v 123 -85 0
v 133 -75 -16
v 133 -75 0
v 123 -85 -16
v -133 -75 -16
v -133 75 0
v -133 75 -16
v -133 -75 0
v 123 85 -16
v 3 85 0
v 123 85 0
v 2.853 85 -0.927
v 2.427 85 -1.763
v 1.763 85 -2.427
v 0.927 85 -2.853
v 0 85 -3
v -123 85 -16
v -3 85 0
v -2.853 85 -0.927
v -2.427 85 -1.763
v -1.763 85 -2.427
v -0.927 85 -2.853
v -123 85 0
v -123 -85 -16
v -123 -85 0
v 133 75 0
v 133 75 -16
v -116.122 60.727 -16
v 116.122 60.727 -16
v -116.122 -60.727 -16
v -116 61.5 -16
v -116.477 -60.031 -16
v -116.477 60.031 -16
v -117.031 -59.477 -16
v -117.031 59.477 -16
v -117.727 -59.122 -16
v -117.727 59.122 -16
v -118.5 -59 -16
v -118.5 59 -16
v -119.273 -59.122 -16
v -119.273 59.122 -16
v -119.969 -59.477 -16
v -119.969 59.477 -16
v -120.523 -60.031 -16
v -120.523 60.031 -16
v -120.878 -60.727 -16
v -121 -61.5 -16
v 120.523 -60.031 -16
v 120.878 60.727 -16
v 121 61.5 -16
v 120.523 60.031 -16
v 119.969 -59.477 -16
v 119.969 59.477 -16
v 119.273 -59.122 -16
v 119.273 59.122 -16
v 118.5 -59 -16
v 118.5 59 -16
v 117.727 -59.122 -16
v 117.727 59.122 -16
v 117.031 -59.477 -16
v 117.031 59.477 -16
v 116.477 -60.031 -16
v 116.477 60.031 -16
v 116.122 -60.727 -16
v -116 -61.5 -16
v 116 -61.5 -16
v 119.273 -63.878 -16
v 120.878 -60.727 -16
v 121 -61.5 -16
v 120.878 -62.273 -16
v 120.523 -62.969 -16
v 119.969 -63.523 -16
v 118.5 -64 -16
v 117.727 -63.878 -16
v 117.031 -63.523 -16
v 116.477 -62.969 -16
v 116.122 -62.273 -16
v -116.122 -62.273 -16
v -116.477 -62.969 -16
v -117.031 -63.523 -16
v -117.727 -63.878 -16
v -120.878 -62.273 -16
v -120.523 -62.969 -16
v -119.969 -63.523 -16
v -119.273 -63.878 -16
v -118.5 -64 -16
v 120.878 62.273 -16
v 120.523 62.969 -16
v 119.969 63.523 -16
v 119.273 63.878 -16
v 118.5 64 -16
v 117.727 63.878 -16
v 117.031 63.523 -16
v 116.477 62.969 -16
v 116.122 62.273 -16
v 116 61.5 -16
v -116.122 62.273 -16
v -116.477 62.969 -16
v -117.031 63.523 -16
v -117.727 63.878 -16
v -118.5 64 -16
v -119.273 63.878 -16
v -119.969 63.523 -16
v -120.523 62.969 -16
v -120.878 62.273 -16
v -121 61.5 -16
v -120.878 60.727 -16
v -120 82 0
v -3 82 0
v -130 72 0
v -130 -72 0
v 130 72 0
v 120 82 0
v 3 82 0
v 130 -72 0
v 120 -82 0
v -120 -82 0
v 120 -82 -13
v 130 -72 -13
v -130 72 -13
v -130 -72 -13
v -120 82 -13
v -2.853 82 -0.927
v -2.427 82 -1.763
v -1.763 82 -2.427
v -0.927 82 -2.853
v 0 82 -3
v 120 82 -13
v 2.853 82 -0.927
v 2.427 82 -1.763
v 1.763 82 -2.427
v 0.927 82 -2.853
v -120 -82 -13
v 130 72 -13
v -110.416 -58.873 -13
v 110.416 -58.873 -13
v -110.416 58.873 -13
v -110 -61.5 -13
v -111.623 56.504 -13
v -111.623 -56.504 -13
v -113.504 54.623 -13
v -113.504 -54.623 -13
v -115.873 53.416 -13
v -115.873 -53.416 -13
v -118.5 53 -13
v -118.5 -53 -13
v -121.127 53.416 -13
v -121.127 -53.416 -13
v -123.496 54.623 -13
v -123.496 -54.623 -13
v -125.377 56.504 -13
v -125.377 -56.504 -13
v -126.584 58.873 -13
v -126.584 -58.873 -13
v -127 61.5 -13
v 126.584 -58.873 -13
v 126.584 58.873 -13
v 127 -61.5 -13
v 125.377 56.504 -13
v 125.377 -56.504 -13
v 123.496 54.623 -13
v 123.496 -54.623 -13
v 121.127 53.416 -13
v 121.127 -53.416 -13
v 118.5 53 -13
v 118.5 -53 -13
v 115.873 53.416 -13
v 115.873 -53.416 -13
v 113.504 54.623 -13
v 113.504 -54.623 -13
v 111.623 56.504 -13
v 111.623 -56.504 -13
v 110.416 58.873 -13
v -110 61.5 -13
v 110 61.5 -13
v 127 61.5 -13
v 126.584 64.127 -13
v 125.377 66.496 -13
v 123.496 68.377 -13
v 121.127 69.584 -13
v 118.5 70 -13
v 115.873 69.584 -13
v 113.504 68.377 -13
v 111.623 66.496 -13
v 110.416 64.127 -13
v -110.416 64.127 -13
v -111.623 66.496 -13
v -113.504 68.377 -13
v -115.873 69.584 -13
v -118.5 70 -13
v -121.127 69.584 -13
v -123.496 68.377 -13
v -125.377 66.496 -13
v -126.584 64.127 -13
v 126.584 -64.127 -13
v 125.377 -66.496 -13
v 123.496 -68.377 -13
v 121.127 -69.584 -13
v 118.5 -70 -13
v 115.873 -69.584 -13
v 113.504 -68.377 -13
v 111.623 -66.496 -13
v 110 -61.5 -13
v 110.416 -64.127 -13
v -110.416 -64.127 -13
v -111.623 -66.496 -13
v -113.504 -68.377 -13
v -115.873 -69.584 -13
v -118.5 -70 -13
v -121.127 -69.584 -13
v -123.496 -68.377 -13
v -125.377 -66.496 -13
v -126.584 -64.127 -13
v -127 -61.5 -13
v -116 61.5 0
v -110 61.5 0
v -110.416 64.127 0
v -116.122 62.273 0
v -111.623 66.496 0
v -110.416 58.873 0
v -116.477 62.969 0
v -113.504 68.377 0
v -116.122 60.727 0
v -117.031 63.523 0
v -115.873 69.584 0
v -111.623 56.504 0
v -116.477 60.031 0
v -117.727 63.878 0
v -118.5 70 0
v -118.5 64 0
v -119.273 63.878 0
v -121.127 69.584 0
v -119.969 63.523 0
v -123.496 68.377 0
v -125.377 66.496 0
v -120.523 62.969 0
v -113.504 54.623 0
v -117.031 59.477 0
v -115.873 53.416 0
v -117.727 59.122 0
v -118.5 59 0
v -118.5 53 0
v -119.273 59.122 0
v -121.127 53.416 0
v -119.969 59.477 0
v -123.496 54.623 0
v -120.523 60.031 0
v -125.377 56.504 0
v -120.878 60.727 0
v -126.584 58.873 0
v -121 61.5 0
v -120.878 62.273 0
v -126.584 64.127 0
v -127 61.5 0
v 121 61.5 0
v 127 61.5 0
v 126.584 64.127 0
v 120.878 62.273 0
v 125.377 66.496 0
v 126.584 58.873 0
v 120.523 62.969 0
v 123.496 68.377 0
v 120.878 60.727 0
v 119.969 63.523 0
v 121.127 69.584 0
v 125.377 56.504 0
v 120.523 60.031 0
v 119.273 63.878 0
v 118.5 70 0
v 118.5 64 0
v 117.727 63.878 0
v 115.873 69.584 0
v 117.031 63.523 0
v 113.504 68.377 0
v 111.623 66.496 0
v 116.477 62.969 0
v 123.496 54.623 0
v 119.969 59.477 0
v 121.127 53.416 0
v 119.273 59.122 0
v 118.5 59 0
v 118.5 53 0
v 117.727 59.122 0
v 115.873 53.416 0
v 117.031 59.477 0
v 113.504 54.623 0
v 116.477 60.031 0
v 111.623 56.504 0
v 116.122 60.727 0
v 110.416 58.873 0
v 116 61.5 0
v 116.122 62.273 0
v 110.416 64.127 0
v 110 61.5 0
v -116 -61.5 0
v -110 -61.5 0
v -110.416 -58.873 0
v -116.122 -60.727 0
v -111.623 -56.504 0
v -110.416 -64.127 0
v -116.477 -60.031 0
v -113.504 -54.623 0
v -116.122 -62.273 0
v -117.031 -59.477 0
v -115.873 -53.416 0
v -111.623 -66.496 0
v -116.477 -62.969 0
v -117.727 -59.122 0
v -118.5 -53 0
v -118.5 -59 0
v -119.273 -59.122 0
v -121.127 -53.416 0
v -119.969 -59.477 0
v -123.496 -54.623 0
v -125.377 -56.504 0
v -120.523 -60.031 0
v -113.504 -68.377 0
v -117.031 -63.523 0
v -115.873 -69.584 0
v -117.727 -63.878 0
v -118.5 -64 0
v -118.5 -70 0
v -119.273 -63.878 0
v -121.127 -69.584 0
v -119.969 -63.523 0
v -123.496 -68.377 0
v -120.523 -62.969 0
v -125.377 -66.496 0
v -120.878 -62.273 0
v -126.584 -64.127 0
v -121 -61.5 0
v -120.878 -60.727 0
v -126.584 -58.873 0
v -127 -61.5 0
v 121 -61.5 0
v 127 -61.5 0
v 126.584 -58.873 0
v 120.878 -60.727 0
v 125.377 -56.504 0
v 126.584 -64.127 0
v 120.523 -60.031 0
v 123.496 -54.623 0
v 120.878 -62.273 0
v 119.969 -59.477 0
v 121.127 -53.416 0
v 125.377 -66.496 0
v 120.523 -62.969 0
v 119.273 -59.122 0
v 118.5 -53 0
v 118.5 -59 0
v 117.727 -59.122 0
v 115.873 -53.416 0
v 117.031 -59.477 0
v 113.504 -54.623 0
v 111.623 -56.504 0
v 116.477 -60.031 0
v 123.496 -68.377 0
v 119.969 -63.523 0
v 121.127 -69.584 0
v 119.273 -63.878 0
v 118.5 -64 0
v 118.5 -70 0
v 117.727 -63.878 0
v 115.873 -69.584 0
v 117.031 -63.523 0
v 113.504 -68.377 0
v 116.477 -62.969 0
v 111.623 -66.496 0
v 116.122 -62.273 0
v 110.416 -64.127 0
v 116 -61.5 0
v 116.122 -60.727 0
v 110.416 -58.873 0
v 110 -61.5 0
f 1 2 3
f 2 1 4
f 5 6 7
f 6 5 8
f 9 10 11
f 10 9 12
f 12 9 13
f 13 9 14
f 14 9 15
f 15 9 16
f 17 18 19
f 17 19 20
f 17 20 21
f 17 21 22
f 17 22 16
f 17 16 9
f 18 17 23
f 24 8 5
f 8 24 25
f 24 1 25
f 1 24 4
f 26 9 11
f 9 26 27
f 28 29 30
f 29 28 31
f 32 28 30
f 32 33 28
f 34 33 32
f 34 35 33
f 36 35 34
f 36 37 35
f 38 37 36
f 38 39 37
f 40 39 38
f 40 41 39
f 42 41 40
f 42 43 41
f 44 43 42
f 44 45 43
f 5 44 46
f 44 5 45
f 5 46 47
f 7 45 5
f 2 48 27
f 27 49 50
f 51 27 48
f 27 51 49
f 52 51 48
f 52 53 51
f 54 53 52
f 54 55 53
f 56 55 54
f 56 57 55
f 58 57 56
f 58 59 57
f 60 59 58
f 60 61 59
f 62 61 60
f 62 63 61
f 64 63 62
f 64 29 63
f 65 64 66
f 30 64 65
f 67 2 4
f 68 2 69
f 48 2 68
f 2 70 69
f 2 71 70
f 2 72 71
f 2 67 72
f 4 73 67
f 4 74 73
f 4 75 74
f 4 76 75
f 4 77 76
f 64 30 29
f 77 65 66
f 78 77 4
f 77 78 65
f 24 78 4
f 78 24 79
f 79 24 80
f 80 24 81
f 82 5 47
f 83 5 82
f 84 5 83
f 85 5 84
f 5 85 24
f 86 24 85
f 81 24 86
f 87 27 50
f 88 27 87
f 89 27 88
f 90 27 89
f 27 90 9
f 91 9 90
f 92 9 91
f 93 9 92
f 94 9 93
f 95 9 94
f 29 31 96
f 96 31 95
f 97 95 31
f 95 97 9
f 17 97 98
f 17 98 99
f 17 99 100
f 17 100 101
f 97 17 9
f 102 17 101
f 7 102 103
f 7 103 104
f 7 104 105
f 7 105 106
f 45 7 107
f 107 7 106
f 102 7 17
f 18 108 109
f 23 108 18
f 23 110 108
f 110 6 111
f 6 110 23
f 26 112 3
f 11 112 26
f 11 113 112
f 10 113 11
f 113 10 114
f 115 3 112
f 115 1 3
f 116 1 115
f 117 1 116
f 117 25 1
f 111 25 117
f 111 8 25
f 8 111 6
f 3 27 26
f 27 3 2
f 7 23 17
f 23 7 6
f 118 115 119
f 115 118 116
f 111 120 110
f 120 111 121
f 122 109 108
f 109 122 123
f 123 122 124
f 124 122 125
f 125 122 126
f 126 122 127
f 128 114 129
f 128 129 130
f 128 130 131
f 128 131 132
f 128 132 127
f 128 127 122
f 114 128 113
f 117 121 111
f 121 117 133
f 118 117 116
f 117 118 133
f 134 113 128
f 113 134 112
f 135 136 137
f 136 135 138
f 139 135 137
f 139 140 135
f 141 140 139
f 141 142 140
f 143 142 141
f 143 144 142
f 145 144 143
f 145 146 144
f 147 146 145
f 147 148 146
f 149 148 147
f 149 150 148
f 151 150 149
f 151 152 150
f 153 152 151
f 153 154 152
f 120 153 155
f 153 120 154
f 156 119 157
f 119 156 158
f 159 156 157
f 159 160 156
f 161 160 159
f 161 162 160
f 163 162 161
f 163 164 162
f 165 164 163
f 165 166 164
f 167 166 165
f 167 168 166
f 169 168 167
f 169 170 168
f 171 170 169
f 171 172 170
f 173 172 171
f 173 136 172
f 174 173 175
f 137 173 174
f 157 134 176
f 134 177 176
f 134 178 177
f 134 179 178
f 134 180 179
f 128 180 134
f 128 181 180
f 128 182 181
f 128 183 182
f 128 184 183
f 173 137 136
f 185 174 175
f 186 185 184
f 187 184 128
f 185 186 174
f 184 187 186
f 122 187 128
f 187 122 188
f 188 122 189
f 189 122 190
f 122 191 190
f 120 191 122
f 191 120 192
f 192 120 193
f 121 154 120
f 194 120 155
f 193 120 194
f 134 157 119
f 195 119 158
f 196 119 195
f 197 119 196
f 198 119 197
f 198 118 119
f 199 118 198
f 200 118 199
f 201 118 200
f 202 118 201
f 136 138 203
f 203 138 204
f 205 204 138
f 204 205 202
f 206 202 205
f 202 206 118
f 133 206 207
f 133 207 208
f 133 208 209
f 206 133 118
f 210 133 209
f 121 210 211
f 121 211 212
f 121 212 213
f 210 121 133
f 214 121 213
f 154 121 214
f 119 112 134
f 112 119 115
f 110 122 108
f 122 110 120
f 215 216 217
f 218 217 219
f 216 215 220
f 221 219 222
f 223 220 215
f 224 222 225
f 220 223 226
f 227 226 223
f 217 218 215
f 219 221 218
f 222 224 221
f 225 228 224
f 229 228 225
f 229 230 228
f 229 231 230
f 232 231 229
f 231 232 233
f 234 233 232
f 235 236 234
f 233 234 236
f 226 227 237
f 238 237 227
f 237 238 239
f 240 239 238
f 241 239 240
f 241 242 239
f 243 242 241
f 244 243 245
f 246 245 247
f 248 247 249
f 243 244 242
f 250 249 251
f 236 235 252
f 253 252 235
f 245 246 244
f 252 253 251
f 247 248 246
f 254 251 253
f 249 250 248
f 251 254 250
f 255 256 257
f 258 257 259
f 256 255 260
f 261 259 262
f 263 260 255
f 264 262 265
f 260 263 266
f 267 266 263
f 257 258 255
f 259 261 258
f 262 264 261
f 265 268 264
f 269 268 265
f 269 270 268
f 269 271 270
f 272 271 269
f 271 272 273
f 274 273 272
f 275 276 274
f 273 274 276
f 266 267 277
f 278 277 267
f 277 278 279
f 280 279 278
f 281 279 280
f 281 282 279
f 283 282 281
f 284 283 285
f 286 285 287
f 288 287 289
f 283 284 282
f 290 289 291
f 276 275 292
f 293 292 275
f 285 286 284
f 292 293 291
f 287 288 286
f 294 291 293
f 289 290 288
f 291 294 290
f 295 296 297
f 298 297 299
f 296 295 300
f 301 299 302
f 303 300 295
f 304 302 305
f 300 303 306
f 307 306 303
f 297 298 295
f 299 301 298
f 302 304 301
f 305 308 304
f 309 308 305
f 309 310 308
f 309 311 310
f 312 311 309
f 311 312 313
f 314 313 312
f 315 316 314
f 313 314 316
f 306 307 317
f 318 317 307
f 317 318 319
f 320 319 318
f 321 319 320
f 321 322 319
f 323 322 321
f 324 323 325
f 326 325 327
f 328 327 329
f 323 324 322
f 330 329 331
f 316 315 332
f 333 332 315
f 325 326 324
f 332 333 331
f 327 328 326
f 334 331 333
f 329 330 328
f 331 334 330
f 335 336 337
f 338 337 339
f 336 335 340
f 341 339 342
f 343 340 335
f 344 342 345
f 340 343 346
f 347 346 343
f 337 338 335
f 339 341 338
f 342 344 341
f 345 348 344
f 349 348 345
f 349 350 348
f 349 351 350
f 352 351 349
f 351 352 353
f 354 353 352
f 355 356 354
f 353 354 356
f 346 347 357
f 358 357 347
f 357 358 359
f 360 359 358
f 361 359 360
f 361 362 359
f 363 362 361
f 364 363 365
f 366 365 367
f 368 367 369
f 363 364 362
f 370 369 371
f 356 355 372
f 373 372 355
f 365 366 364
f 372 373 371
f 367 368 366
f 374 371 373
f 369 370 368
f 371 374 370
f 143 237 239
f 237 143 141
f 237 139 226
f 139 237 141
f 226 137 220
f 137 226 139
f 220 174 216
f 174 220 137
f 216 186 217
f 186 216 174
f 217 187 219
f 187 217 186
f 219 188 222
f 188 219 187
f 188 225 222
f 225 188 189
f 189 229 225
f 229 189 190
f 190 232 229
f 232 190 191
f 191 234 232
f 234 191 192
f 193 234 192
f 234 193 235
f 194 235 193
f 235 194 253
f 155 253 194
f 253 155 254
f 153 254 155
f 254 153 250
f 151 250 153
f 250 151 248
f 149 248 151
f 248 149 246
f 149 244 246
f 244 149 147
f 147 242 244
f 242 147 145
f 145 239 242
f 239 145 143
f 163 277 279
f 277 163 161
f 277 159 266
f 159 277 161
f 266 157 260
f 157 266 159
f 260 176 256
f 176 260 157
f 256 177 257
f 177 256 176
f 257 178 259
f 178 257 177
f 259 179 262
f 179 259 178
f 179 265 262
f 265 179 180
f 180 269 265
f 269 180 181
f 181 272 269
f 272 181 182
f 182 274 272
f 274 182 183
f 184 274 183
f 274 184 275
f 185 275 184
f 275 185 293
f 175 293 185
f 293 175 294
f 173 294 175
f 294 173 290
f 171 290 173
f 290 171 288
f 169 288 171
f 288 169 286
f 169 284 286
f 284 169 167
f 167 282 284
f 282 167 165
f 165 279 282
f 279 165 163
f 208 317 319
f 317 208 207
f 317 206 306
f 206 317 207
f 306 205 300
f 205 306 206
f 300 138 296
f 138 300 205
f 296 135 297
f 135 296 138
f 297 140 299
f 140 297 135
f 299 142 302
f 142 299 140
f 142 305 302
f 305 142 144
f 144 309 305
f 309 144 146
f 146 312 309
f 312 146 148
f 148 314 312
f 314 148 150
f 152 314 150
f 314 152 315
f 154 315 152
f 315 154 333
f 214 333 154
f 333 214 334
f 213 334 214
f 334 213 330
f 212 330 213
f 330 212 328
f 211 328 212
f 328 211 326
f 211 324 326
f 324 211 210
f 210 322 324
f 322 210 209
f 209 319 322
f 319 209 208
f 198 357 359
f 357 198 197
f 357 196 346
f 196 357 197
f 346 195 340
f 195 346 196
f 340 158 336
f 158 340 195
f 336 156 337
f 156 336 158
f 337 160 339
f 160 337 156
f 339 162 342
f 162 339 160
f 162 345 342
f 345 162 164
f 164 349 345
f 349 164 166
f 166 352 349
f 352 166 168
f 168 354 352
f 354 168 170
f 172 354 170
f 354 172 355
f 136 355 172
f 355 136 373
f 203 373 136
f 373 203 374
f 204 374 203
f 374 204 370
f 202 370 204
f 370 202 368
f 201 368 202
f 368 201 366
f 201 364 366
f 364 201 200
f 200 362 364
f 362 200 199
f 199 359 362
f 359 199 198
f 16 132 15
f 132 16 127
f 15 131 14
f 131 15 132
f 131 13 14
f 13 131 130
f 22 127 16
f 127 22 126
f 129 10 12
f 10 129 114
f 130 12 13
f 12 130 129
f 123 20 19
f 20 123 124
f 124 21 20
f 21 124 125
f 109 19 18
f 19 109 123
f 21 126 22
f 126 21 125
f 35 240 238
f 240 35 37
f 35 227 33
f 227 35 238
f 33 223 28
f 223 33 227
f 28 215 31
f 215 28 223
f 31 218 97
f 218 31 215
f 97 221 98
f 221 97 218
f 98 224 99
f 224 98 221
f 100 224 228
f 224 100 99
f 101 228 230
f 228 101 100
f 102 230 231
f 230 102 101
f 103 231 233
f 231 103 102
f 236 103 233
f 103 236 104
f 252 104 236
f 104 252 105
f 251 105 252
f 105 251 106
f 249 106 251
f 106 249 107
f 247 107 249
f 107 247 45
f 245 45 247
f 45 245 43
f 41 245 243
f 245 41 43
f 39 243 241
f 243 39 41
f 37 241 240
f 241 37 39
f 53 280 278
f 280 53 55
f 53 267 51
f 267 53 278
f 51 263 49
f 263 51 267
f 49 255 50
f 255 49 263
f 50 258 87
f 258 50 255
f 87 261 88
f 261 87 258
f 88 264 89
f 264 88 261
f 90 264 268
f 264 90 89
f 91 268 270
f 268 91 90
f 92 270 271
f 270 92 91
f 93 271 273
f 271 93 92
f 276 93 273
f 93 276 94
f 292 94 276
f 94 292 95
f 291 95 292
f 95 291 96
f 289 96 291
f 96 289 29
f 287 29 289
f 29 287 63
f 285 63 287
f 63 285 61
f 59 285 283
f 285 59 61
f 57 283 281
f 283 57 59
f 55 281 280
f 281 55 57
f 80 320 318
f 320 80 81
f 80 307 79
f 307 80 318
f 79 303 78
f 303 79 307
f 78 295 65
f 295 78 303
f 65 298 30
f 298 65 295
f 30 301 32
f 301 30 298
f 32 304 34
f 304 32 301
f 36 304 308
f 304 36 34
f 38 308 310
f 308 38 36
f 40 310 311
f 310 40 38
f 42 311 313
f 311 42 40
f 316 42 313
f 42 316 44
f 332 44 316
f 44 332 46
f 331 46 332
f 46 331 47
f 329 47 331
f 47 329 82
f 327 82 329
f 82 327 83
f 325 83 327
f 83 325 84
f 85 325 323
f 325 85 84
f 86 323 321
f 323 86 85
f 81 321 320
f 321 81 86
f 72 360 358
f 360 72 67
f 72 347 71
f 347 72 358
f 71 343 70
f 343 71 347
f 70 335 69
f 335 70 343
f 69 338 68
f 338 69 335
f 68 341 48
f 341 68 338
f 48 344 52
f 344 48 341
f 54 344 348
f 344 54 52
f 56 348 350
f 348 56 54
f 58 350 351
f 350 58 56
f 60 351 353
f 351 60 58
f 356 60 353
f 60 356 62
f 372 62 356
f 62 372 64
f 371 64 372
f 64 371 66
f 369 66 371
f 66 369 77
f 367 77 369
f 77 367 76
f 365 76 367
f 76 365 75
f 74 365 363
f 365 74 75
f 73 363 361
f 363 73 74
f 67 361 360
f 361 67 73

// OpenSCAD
// file: parts/base.scad
/// Creates a base for a fight stick.
/// `corner_length` is the size of the corners
/// `box_width` is the width of the box
/// `box_height` is the height of the box
module base(corner_length = 10, box_width = 220, box_height = 140) {
    module corner() {
        points = [
            [0,0],
            [0,corner_length],
            [corner_length,corner_length],
        ];

        translate([-corner_length / 2, -corner_length / 2,0])
        polygon(points);
    }

    module edge() {   
        // Corner 1
        mirror([1,0,0])
        translate([box_width / 2, 0,0])
        corner();

        // Connector
        connector_width = box_width - 1 * corner_length;

        translate([-connector_width / 2, -corner_length / 2,0])
        polygon([
        [0,0],
        [connector_width,0],
        [connector_width, corner_length],
        [0, corner_length]
        ]);


        // Corner 2
        translate([box_width / 2, 0,0])
        corner();

    }

    module fill() {
        fill_width = box_width + corner_length;
        fill_height = box_height - corner_length;

        translate([-fill_width / 2, -fill_height / 2,0])
        polygon([
            [0,0],
            [fill_width,0],
            [fill_width, fill_height],
            [0, fill_height]
        ]);
    }

    // Bottom side
    translate([0, -box_height / 2,0])
    edge();

    // Top side
    mirror([0,1,0])
    translate([0, -box_height / 2,0])
    edge();

    // Fill it all
    fill();
}
// file: slimbox_dimensions.scad
/*
This file contains all dimensions for the final prints.
*/

$fn = 20;


dim_box_width = 256;
dim_box_height = 160;
dim_box_depth = 26;
dim_box_bot_depth = 16;
dim_face_thickness = 4;
dim_wall_thickness = 6;
dim_base_thickness = 3;
dim_cord_cutout_diameter = 6;
dim_screw_diameter = 2.5;
// file: parts/screw_cutouts.scad
/*
This is a generic screw cutout for the fight stick.
*/

// Screws
module screw(
    screw_diameter
    ) {
    screw_diameter = max(1, screw_diameter);
    circle(screw_diameter, true);
}

/// Creates screws/screw holders for a fight stick.
module screws(is_holder = false, corner_length = 10, box_width = 220, box_height = 140, screw_diameter=5, holder_thickness=6, screw_height=200) {
    module corner() {
        diameter = is_holder ? screw_diameter + holder_thickness : screw_diameter;
        x_offset =  screw_diameter + holder_thickness;
        y_offset =  screw_diameter + holder_thickness;
        translate([x_offset, y_offset,0])
        screw(diameter);
    }

    module edge() {   
        // Corner 1
        mirror([1,0,0])
        translate([box_width / 2, 0,0])
        corner();

        // Connector
        connector_width = box_width - 1 * corner_length;

        // Corner 2
        translate([box_width / 2, 0,0])
        corner();

    }

    linear_extrude(height=screw_height)
    {
        // Bottom side
        translate([0, -box_height / 2, 0])
        edge();

        // Top side
        mirror([0,1,0])
        translate([0, -box_height / 2, 0])
        edge();
    }
}
// file: parts/top.scad
/*
This is a generic top for the fight stick.
*/

include <base.scad>;


/// Creates a generic top for the hitbox
/// `corner_length` is the size of the corners
/// `box_width` is the width of the box
/// `box_height` is the height of the box
/// `box_depth` is the depth of the box
/// `wall_thickness` is the thickness of the walls
/// `face_thickness` is the thickness of the top/face
module top(
    corner_length = 10, 
    box_width = 220, 
    box_height = 140, 
    box_depth = 20, 
    wall_thickness = 5,
    face_thickness = 10,
    ) {
    face_thickness = max(1, face_thickness);
       
    difference() {            
        // Set up the 'shell' which is the absolute size of the box.
        linear_extrude(height = box_depth)
        base(corner_length = corner_length, box_width = box_width, box_height = box_height);
        
        // Do a cut out for the inside
        color([1,0,0,1])
        linear_extrude(height = box_depth - face_thickness)
        base(
            corner_length = corner_length, 
            box_width = box_width  - wall_thickness, 
            box_height = box_height  - wall_thickness
        );
    }
}
// file: parts/hitbox_buttons.scad
small_btn_diameter = 25; // mm
large_btn_diameter = 31 ; // mm

btn_height = 32; // mm

module btn(x,y,z, dia, color = [1,0,0]) {
    translate([x,y,z])
    color(color)
    cylinder(h = btn_height, d = dia);
}

module hitbox_buttons() {
    vertical_spacing = 30; // vertical spacing between small buttons
    horz_spacing = 2;
    row1_spacing = 14;

    //
    // Buttons for hand
    //


    // row 1
    row1_horz = row1_spacing + horz_spacing;
    row1_vert = 25;
    btn(row1_horz, row1_vert, 0, small_btn_diameter);
    btn(row1_horz, row1_vert -vertical_spacing, 0, small_btn_diameter);

    // row 2
    row2_horz_offset = 25 + horz_spacing;
    row2_vert_offset = 14;

    row2_horz = row1_horz + row2_horz_offset;
    row2_vert = row1_vert + row2_vert_offset;

    btn(row2_horz, row2_vert, 0, small_btn_diameter);
    btn(row2_horz, row2_vert -vertical_spacing, 0, small_btn_diameter);


    // row 3
    row3_horz_offset = 29 + horz_spacing;
    row3_vert_offset = row2_vert_offset;

    row3_horz = row2_horz + row3_horz_offset;
    row3_vert = row1_vert + row3_vert_offset;

    btn(row3_horz, row3_vert, 0, small_btn_diameter);
    btn(row3_horz, row3_vert -vertical_spacing, 0, small_btn_diameter);


    // row 4
    row4_horz_offset = 28 + horz_spacing;
    row4_vert_offset = 7;

    row4_horz = row3_horz + row4_horz_offset;
    row4_vert = row1_vert + row4_vert_offset;

    btn(row4_horz, row4_vert, 0, small_btn_diameter);
    btn(row4_horz, row4_vert -vertical_spacing, 0, small_btn_diameter);


    //
    // Movement buttons
    //
    
    module move_buttons() {
        move1_horz = -row1_spacing - 3;
        move1_vert = 28;
        btn(move1_horz, move1_vert, 0, small_btn_diameter);

        // move 2
        move2_horz_offset = -row2_horz_offset;
        move2_vert_offset = row2_vert_offset;

        move2_horz = move1_horz + move2_horz_offset;
        move2_vert = move1_vert + move2_vert_offset;

        btn(move2_horz, move2_vert, 0, small_btn_diameter);


        // move 3
        move3_horz_offset = -row3_horz_offset;
        move3_vert_offset = move2_vert_offset;

        move3_horz = move2_horz + move3_horz_offset;
        move3_vert = move1_vert + move3_vert_offset;

        btn(move3_horz, move3_vert, 0, small_btn_diameter);
    }
    
    move_buttons();
    
    // Start, select, home
    translate([0,row1_vert +5,0]){
        move_buttons();
    }

    

    // Large btn

    move0_horz = 0;
    move0_vert = -38;
    btn(move0_horz, move0_vert, 0, large_btn_diameter);
};
// main file
/*
This file is the bottom of the fight stick.
*/

include <parts/hitbox_buttons.scad>;
include <parts/top.scad>;
include <parts/screw_cutouts.scad>;
include <slimbox_dimensions.scad>;

height = dim_box_bot_depth;

module shell()
{
    screws(is_holder=true, screw_diameter=dim_screw_diameter, screw_height=height);
    top(box_width = dim_box_width, box_height = dim_box_height, box_depth = height, wall_thickness=dim_wall_thickness, face_thickness = dim_base_thickness);
}

module cord_cutout(){
    color([1,0,0])
    rotate([270,0,0])
    translate([0,0,0])
    cylinder(dim_box_height, d1=dim_cord_cutout_diameter,d2=dim_cord_cutout_diameter, true);
}

;

mirror([0,0,-1])
difference(){
    shell();
    cord_cutout();
    translate([0,0,-dim_wall_thickness])
    screws(is_holder=false, screw_diameter=dim_screw_diameter, screw_height=2000);
}
